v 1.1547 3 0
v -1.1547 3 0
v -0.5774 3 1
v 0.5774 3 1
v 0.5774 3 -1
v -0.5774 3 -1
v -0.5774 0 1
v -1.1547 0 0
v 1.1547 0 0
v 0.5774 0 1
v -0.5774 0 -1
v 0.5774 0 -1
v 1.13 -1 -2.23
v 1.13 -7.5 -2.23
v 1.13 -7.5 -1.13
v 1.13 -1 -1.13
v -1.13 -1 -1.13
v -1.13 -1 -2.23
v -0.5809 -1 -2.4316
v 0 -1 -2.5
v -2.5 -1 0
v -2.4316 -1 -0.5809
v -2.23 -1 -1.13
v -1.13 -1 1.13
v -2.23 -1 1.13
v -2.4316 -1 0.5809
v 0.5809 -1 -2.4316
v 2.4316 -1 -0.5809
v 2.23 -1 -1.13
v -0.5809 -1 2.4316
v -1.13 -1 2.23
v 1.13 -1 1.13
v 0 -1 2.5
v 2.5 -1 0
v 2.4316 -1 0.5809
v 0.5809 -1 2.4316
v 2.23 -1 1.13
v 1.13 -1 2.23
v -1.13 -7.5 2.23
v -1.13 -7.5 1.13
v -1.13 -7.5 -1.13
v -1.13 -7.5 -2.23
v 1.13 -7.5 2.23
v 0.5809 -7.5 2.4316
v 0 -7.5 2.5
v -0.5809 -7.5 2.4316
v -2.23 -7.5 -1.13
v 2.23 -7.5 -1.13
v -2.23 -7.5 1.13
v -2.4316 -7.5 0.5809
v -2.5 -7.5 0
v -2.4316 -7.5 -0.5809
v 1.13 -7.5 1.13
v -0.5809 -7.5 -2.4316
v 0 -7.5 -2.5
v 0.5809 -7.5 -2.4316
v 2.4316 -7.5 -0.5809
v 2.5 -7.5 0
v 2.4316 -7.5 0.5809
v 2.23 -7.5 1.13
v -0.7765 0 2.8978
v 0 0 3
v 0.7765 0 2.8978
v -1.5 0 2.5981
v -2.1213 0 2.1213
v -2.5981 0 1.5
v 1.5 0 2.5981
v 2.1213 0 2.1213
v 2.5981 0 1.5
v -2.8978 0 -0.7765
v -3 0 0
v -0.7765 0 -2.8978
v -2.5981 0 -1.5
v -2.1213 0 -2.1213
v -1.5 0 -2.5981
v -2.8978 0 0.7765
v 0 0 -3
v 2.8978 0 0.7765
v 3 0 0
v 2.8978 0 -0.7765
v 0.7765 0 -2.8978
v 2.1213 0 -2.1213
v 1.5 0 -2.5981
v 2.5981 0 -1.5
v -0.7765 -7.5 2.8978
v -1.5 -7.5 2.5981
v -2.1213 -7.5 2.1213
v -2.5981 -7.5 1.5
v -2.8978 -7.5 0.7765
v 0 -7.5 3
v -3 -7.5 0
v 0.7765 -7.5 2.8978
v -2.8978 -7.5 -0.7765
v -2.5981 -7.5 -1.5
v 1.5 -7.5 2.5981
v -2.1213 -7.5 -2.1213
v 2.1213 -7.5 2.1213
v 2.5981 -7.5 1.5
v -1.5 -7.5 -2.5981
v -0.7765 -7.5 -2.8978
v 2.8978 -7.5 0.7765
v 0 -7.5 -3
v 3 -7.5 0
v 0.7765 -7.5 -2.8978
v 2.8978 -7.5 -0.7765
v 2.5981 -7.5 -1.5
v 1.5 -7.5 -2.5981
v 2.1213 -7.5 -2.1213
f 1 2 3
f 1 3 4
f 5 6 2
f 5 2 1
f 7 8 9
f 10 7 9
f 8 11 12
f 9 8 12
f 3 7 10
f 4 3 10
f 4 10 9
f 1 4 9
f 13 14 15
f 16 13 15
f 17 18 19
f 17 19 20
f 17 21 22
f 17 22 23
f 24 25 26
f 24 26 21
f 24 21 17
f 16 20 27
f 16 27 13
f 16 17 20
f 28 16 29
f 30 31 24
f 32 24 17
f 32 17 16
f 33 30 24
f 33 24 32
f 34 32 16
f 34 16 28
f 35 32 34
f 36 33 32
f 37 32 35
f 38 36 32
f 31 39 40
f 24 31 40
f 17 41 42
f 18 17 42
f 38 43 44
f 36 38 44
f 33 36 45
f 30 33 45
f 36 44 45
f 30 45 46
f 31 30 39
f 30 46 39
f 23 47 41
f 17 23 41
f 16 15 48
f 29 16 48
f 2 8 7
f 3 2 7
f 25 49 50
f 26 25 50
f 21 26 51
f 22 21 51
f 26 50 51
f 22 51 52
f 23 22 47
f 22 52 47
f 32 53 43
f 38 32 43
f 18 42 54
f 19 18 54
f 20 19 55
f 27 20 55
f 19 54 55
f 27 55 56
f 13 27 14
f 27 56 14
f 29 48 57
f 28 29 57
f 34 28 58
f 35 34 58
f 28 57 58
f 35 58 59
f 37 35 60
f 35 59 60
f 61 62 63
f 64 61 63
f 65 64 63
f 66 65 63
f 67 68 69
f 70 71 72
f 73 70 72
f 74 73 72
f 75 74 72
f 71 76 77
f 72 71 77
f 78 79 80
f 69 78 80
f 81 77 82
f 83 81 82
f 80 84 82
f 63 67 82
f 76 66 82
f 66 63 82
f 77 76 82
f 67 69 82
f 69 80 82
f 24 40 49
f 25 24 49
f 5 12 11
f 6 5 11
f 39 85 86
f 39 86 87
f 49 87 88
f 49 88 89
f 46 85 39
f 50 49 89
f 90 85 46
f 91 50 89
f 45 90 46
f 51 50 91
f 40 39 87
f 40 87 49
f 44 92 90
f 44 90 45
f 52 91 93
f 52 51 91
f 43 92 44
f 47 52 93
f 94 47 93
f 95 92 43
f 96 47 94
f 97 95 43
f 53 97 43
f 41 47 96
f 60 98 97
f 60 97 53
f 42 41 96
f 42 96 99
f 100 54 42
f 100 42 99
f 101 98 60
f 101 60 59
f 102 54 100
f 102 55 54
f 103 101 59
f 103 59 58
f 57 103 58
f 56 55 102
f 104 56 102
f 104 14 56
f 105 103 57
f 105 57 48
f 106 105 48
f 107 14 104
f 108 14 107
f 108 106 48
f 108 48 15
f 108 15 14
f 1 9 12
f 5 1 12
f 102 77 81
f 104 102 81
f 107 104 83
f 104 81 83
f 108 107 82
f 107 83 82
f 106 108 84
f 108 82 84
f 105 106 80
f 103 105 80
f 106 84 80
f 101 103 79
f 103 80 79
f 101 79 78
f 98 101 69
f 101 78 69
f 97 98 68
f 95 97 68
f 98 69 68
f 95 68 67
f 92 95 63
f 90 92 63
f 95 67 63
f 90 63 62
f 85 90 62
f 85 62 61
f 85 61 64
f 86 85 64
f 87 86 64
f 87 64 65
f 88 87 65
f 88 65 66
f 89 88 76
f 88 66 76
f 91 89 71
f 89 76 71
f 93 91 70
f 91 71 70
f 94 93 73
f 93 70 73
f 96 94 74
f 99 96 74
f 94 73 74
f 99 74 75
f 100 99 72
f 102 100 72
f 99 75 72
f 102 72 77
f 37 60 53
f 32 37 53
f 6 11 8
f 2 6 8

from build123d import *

# Parameters (mm, degrees)
EXTRUDE_1_DEPTH     = 3
SKETCH_2_R          = 3
EXTRUDE_2_DEPTH     = 7.5
CUT_EXTRUDE_START   = 7.5
CUT_EXTRUDE_1_DEPTH = 6.5


with BuildPart() as part:
    # 草图1 → 凸台-拉伸1 (new body)
    with BuildSketch(Plane(origin=(0, 0, 0), x_dir=(1, 0, 0), z_dir=(0, 1, 0))):
        Polygon((0.577350269, 1), (-0.577350269, 1), (-1.154700538, 0), (-0.577350269, -1), (0.577350269, -1), (1.154700538, 0), align=None)
    extrude(amount=EXTRUDE_1_DEPTH)


with BuildPart() as body_2:
    # 草图2 → 凸台-拉伸2 (new body)
    with BuildSketch(Plane.XZ):
        with Locations(Location((0, 0, 0), (0, 0, 270))):
            Circle(SKETCH_2_R)
    extrude(amount=EXTRUDE_2_DEPTH)

    # 草图2<3> → 切除-拉伸1 (cut)
    with BuildSketch(Plane.XZ.offset(CUT_EXTRUDE_START)):
        with BuildLine():
            Line((-1.130029762, -1.130029762), (-1.130029762, -2.230029762))
            ThreePointArc((-1.130029762, -2.230029762), (0, -2.5), (1.130029762, -2.230029762))
            Line((1.130029762, -2.230029762), (1.130029762, -1.130029762))
            Line((1.130029762, -1.130029762), (2.230029762, -1.130029762))
            ThreePointArc((2.230029762, -1.130029762), (2.5, 0), (2.230029762, 1.130029762))
            Line((2.230029762, 1.130029762), (1.130029762, 1.130029762))
            Line((1.130029762, 1.130029762), (1.130029762, 2.230029762))
            ThreePointArc((1.130029762, 2.230029762), (0, 2.5), (-1.130029762, 2.230029762))
            Line((-1.130029762, 2.230029762), (-1.130029762, 1.130029762))
            Line((-1.130029762, 1.130029762), (-2.230029762, 1.130029762))
            ThreePointArc((-2.230029762, 1.130029762), (-2.5, 0), (-2.230029762, -1.130029762))
            Line((-2.230029762, -1.130029762), (-1.130029762, -1.130029762))
        make_face()
    extrude(amount=-CUT_EXTRUDE_1_DEPTH, mode=Mode.SUBTRACT)


solid = Compound([part.part, body_2.part])
